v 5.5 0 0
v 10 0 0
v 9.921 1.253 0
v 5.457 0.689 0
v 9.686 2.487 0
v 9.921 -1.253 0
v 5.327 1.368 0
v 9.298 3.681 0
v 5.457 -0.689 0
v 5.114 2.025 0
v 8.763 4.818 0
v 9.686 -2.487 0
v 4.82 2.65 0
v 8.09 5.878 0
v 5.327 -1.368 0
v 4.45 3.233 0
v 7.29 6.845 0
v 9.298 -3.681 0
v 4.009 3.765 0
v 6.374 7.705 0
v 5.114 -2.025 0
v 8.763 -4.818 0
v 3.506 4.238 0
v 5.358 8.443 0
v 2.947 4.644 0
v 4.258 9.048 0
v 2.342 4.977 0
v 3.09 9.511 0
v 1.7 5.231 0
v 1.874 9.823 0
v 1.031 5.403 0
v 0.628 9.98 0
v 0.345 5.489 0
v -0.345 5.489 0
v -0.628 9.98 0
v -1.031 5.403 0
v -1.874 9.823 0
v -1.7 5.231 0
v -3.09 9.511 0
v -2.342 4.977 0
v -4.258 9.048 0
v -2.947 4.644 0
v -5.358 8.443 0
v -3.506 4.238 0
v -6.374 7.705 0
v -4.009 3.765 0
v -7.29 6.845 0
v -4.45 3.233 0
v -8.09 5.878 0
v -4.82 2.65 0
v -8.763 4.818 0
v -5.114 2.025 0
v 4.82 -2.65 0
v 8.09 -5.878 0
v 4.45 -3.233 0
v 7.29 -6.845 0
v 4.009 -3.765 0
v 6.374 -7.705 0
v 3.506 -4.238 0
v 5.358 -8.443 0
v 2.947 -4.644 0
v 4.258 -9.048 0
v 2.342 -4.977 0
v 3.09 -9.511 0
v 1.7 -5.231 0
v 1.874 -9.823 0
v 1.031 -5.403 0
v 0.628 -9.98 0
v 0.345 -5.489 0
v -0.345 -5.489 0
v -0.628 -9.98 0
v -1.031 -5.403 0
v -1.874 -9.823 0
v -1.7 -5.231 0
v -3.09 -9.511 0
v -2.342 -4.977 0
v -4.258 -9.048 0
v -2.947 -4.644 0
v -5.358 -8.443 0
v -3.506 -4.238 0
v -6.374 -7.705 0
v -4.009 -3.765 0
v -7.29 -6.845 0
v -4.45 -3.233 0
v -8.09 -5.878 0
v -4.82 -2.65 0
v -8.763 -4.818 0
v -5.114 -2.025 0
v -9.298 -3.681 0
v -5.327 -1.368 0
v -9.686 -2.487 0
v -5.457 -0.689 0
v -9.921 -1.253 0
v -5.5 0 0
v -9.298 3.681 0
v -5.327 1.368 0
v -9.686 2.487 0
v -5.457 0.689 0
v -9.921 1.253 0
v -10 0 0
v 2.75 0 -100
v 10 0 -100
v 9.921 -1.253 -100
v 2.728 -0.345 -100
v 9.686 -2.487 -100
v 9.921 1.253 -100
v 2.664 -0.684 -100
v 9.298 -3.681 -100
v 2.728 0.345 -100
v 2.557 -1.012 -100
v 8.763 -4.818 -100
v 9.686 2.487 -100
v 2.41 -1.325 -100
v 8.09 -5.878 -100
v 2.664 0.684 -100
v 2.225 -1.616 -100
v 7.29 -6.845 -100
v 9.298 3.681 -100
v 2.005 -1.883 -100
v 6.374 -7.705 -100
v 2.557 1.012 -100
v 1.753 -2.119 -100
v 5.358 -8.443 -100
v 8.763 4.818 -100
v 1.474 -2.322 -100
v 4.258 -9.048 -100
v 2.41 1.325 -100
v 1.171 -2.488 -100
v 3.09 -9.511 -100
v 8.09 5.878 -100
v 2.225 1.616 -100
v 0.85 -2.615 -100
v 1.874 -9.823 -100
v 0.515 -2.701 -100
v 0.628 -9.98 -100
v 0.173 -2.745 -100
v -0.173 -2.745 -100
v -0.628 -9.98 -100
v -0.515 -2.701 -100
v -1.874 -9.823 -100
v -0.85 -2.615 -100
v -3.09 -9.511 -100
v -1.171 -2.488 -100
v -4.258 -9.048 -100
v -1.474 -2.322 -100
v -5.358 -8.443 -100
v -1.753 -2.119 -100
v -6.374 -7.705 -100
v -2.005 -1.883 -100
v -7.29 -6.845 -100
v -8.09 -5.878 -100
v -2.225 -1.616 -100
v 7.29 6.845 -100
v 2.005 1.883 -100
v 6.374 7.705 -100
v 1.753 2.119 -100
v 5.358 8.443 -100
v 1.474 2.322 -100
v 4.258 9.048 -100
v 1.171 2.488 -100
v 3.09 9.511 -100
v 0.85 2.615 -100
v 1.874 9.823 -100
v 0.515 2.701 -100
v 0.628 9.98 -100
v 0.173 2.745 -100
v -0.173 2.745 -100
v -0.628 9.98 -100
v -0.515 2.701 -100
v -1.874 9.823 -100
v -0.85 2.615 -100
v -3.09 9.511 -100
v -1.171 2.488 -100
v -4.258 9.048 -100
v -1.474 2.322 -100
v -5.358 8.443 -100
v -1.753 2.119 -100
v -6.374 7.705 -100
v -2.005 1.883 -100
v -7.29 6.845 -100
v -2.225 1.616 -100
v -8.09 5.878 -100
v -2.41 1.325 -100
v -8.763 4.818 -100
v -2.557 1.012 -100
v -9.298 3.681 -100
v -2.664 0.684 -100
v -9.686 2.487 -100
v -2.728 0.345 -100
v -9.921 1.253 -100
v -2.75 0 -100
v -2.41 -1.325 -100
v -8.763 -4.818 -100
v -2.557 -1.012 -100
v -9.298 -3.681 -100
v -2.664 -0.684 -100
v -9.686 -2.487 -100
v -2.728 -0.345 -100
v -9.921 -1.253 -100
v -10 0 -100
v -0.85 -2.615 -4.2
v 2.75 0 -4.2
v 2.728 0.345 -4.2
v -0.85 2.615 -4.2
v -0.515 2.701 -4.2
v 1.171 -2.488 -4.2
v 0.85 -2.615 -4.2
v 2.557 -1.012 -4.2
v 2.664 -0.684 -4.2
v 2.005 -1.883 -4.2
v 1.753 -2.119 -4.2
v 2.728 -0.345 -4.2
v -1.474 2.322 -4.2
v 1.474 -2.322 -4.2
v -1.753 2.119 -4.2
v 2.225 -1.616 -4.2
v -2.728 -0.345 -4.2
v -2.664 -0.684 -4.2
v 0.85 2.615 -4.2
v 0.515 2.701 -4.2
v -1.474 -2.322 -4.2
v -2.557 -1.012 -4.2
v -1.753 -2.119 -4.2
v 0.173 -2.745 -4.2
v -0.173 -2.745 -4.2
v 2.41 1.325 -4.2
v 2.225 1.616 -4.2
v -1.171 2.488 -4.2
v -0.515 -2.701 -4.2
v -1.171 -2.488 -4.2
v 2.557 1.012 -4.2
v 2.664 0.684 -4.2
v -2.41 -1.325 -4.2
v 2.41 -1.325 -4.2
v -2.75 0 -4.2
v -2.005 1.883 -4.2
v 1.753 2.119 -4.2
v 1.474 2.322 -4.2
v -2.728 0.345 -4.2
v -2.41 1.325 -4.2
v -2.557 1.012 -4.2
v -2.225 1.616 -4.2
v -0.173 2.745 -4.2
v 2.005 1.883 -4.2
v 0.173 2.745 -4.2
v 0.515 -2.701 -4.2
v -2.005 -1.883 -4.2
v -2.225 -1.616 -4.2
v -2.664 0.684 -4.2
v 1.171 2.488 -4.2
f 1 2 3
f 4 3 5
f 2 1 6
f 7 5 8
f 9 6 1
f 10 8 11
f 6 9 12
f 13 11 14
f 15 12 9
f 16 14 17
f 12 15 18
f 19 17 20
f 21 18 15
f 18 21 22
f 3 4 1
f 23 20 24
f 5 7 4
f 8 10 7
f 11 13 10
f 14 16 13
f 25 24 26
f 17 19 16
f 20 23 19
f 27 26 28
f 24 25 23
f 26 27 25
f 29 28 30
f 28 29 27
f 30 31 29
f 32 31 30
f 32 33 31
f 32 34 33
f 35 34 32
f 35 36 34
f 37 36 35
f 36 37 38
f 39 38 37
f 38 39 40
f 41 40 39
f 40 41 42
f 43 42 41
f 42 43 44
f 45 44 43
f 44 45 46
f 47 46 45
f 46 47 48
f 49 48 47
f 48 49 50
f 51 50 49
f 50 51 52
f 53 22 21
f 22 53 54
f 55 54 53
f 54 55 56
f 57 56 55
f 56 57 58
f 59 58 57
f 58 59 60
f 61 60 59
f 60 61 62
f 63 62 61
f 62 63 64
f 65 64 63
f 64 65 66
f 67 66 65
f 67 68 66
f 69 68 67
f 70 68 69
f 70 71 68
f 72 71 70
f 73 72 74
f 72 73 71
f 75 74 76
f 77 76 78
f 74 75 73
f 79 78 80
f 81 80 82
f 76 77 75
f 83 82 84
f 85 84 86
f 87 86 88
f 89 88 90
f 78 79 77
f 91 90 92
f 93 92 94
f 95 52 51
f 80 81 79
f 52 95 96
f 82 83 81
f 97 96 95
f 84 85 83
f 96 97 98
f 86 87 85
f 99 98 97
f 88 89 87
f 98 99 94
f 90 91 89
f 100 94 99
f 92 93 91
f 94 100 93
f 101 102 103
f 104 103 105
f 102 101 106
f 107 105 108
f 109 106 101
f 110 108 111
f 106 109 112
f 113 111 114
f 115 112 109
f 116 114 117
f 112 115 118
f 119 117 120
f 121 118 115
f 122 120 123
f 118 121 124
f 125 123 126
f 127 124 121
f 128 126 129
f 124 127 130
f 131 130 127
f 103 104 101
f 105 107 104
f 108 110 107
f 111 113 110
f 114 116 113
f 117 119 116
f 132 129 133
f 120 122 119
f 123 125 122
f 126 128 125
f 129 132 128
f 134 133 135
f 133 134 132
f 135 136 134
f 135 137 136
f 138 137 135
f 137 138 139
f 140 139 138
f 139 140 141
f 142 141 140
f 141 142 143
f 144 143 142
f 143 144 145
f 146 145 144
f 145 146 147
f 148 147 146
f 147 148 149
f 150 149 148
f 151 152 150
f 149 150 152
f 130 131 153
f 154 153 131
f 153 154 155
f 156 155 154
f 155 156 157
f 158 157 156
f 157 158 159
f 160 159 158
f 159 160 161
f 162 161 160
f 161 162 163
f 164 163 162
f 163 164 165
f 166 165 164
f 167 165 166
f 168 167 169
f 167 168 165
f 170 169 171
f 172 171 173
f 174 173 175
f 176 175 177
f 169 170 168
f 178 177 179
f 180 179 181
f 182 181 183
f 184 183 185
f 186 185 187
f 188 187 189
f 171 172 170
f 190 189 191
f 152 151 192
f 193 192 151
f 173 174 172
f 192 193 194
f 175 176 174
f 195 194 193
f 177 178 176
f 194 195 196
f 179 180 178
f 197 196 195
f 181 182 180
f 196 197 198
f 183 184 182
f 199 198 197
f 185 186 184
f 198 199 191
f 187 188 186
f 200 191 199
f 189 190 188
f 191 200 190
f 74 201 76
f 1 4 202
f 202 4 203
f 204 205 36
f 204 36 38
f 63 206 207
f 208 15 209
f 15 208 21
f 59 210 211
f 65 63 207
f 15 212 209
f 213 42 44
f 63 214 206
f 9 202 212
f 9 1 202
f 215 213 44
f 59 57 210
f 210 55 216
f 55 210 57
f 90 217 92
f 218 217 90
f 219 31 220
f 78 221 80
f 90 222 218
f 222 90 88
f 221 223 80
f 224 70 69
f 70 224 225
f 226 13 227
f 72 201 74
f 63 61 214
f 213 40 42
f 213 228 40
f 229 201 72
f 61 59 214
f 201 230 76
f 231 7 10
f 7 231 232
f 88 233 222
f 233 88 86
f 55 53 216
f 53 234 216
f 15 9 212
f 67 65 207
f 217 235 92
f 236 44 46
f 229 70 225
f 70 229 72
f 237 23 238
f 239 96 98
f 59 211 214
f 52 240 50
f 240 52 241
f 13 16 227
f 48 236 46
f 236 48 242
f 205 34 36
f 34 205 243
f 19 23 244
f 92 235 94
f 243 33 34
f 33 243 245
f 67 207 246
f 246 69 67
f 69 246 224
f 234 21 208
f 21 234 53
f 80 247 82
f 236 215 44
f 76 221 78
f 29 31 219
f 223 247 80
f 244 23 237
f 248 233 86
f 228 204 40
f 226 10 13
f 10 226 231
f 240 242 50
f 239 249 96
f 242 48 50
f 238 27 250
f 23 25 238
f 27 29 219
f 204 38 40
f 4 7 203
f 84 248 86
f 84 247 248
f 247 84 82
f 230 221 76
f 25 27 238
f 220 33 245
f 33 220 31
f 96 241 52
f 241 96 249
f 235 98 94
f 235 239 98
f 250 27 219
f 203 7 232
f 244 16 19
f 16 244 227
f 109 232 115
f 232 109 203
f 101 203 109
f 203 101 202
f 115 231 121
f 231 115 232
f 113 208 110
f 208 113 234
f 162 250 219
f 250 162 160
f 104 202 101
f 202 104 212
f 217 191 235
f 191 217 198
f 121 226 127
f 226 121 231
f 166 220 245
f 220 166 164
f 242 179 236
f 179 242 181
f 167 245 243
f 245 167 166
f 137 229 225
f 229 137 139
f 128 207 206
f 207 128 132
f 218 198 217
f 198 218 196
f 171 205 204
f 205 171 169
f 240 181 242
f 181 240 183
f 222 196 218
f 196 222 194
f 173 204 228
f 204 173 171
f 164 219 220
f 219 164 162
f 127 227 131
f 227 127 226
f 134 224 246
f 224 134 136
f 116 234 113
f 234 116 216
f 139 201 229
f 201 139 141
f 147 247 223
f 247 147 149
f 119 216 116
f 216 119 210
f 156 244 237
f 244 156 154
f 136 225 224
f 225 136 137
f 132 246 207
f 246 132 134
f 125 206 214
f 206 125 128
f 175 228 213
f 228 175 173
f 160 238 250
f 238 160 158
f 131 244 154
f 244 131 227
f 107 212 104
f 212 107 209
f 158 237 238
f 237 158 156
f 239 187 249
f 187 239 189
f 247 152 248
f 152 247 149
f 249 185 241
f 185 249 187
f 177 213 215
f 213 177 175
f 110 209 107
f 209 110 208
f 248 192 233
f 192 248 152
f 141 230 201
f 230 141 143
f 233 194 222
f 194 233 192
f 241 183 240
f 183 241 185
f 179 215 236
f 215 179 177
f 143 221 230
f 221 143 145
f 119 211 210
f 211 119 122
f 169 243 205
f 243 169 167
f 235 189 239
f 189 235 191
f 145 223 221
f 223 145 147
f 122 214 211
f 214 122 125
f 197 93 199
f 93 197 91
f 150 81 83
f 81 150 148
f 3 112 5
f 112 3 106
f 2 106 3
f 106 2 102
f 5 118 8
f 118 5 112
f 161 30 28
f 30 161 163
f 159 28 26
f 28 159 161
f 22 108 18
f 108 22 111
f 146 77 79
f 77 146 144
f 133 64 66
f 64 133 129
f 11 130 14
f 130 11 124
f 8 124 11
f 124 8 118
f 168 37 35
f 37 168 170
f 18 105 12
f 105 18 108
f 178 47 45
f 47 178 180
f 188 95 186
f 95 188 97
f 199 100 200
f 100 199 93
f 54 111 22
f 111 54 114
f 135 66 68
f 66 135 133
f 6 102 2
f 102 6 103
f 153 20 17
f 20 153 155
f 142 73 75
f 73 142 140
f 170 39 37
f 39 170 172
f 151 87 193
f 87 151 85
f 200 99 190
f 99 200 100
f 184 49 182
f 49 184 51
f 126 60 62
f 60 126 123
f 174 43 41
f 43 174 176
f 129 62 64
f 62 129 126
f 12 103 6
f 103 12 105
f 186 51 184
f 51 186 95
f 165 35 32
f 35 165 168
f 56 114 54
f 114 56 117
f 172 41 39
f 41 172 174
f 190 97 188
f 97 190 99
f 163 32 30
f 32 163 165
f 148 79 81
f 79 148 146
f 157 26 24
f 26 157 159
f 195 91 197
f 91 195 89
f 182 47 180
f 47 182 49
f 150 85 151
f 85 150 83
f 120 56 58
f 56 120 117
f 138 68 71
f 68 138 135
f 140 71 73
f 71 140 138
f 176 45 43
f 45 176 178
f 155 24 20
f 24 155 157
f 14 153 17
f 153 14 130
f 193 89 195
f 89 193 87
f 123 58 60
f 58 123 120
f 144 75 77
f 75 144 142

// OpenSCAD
$fn = 50;


difference() {
	union() {
		translate(v = [0, 0, -100.0000000000]) {
			cylinder(h = 100, r = 10.0000000000);
		}
		cylinder(h = 0, r = 16.0000000000);
	}
	union() {
		translate(v = [0, 0, 0]) {
			rotate(a = [0, 0, 0]) {
				difference() {
					union() {
						#translate(v = [0, 0, -100.0000000000]) {
							cylinder(h = 100, r = 2.2500000000);
						}
						#translate(v = [0, 0, -4.2000000000]) {
							cylinder(h = 4.2000000000, r1 = 2.7500000000, r2 = 5.5000000000);
						}
						#translate(v = [0, 0, -100.0000000000]) {
							cylinder(h = 100, r = 2.7500000000);
						}
						#translate(v = [0, 0, -100.0000000000]) {
							cylinder(h = 100, r = 2.2500000000);
						}
					}
					union();
				}
			}
		}
	}
}
